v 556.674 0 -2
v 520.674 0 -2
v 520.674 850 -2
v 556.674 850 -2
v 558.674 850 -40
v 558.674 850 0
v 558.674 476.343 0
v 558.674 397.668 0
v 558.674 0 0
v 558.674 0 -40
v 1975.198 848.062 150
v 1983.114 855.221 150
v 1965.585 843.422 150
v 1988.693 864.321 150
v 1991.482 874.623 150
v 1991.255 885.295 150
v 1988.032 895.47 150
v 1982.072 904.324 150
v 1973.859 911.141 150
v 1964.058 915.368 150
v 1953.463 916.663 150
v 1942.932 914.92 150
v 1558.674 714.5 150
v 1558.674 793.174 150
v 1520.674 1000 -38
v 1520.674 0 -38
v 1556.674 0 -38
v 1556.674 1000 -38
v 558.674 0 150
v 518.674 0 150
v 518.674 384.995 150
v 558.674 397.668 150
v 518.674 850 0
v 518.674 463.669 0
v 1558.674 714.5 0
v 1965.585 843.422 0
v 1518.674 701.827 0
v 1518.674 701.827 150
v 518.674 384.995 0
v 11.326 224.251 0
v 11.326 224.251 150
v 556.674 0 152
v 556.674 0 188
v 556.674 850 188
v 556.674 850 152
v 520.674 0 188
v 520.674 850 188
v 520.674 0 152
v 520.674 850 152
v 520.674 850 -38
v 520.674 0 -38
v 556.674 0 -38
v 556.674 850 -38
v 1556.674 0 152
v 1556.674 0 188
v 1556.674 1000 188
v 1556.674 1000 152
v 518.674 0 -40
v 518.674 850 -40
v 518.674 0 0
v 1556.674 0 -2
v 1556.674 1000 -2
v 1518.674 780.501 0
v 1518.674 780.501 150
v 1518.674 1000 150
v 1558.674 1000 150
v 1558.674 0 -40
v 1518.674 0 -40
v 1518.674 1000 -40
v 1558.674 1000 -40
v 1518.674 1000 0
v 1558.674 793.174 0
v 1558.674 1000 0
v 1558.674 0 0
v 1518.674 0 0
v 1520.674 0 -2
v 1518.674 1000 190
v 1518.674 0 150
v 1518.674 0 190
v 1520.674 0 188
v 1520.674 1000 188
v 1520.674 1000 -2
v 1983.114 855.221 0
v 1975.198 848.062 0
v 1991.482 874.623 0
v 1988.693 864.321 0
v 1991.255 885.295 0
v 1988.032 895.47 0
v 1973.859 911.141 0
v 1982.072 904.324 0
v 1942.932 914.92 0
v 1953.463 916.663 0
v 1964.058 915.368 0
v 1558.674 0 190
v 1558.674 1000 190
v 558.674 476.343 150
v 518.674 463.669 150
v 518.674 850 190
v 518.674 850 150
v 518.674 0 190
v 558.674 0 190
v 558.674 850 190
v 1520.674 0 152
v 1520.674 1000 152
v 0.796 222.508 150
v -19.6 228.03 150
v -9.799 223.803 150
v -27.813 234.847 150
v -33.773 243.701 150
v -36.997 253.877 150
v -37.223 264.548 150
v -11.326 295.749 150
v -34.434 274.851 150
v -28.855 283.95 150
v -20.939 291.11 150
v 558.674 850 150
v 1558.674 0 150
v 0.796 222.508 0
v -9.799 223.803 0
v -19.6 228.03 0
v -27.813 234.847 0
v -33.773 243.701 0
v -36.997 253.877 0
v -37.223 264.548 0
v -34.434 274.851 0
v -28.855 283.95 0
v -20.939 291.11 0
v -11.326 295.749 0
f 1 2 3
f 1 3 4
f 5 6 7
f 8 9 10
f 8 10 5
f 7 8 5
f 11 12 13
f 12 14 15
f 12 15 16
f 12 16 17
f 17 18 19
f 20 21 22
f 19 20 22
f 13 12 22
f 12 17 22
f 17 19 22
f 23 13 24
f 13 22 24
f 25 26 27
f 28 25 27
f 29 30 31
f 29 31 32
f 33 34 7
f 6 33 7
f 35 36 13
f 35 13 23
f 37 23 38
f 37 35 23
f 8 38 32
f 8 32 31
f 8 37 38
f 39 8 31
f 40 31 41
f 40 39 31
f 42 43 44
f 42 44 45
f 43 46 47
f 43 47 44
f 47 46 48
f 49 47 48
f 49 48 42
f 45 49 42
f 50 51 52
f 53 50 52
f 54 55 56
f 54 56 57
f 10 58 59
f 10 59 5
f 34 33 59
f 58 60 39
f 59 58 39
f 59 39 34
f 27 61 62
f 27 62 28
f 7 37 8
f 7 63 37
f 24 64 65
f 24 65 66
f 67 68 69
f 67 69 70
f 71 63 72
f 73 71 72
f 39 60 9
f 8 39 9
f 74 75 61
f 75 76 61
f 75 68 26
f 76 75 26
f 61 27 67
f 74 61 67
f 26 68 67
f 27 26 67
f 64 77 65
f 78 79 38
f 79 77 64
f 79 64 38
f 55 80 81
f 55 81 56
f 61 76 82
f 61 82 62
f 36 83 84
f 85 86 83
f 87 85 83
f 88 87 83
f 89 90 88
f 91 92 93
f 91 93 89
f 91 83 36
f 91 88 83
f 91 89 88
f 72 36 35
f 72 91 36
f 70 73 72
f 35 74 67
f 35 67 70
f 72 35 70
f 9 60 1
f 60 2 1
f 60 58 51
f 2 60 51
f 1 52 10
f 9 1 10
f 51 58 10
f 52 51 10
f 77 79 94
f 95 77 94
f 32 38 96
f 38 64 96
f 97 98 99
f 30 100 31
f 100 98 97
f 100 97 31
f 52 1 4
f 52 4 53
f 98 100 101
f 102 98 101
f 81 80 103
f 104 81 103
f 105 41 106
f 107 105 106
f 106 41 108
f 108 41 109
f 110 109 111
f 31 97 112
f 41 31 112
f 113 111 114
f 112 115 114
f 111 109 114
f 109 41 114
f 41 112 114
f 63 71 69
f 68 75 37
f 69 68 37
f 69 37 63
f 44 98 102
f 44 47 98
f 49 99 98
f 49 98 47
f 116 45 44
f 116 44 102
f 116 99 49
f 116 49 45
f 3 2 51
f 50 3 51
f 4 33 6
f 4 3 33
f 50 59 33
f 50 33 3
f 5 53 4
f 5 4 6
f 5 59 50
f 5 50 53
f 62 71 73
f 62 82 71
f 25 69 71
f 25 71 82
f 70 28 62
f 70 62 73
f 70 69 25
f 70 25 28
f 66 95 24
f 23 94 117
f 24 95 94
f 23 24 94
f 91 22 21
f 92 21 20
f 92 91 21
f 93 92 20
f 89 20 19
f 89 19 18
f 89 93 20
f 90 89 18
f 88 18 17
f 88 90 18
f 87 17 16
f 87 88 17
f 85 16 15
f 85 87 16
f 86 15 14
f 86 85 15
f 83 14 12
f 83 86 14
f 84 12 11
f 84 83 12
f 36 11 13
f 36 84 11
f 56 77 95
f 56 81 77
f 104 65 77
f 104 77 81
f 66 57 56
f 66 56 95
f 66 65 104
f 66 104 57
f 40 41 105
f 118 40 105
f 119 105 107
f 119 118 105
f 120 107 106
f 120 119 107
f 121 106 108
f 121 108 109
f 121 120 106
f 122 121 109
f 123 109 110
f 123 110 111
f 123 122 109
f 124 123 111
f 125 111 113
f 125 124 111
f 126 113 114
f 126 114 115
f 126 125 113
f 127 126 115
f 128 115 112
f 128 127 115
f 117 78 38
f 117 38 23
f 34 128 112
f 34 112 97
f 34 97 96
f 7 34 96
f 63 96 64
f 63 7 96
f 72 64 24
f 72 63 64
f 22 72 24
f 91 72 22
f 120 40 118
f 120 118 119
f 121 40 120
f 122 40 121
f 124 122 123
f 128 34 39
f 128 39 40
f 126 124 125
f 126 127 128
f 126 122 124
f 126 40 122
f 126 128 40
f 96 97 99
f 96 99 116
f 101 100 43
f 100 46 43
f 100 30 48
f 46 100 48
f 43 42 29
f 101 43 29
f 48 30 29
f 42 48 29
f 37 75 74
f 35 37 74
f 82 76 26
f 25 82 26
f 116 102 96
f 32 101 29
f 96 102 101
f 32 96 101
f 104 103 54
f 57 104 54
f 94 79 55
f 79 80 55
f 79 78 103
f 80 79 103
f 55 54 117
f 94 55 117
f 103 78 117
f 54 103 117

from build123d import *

# Parameters (mm, degrees)
BOSS_EXTRUDE1_DEPTH = 150
SKETCH3_W           = 40
SKETCH3_H           = 40
SKETCH3_W_2         = 36
SKETCH3_H_2         = 36
BOSS_EXTRUDE2_DEPTH = 850
SKETCH4_W           = 40
SKETCH4_H           = 40
SKETCH4_W_2         = 36
SKETCH4_H_2         = 36
BOSS_EXTRUDE3_DEPTH = 1000


with BuildPart() as part:
    # Sketch1 → Boss-Extrude1 (new body)
    with BuildSketch(Plane.XY):
        with BuildLine():
            Line((-11.326300276, 295.748635247), (1942.932426579, 914.919717023))
            ThreePointArc((1942.932426579, 914.919717023), (1990.007362103, 890.497382052), (1965.585027132, 843.422446529))
            Line((1965.585027132, 843.422446529), (11.326300276, 224.251364753))
            ThreePointArc((11.326300276, 224.251364753), (-35.748635247, 248.673699724), (-11.326300276, 295.748635247))
        make_face()
    extrude(amount=BOSS_EXTRUDE1_DEPTH)

    # Sketch3 → Boss-Extrude2 (add)
    with BuildSketch(Plane(origin=(0, 0, 0), x_dir=(1, 0, 0), z_dir=(0, 1, 0))):
        with Locations((538.673699724, 20)):
            Rectangle(SKETCH3_W, SKETCH3_H)
        with Locations((538.673699724, 20)):
            Rectangle(SKETCH3_W_2, SKETCH3_H_2, mode=Mode.SUBTRACT)
        with Locations((538.673699724, -170)):
            Rectangle(SKETCH3_W, SKETCH3_H)
        with Locations((538.673699724, -170)):
            Rectangle(SKETCH3_W_2, SKETCH3_H_2, mode=Mode.SUBTRACT)
    extrude(amount=BOSS_EXTRUDE2_DEPTH)

    # Sketch4 → Boss-Extrude3 (add)
    with BuildSketch(Plane(origin=(0, 0, 0), x_dir=(1, 0, 0), z_dir=(0, 1, 0))):
        with Locations((1538.673699724, 20)):
            Rectangle(SKETCH4_W, SKETCH4_H)
        with Locations((1538.673699724, 20)):
            Rectangle(SKETCH4_W_2, SKETCH4_H_2, mode=Mode.SUBTRACT)
        with Locations((1538.673699724, -170)):
            Rectangle(SKETCH4_W, SKETCH4_H)
        with Locations((1538.673699724, -170)):
            Rectangle(SKETCH4_W_2, SKETCH4_H_2, mode=Mode.SUBTRACT)
    extrude(amount=BOSS_EXTRUDE3_DEPTH)


solid = part.part
